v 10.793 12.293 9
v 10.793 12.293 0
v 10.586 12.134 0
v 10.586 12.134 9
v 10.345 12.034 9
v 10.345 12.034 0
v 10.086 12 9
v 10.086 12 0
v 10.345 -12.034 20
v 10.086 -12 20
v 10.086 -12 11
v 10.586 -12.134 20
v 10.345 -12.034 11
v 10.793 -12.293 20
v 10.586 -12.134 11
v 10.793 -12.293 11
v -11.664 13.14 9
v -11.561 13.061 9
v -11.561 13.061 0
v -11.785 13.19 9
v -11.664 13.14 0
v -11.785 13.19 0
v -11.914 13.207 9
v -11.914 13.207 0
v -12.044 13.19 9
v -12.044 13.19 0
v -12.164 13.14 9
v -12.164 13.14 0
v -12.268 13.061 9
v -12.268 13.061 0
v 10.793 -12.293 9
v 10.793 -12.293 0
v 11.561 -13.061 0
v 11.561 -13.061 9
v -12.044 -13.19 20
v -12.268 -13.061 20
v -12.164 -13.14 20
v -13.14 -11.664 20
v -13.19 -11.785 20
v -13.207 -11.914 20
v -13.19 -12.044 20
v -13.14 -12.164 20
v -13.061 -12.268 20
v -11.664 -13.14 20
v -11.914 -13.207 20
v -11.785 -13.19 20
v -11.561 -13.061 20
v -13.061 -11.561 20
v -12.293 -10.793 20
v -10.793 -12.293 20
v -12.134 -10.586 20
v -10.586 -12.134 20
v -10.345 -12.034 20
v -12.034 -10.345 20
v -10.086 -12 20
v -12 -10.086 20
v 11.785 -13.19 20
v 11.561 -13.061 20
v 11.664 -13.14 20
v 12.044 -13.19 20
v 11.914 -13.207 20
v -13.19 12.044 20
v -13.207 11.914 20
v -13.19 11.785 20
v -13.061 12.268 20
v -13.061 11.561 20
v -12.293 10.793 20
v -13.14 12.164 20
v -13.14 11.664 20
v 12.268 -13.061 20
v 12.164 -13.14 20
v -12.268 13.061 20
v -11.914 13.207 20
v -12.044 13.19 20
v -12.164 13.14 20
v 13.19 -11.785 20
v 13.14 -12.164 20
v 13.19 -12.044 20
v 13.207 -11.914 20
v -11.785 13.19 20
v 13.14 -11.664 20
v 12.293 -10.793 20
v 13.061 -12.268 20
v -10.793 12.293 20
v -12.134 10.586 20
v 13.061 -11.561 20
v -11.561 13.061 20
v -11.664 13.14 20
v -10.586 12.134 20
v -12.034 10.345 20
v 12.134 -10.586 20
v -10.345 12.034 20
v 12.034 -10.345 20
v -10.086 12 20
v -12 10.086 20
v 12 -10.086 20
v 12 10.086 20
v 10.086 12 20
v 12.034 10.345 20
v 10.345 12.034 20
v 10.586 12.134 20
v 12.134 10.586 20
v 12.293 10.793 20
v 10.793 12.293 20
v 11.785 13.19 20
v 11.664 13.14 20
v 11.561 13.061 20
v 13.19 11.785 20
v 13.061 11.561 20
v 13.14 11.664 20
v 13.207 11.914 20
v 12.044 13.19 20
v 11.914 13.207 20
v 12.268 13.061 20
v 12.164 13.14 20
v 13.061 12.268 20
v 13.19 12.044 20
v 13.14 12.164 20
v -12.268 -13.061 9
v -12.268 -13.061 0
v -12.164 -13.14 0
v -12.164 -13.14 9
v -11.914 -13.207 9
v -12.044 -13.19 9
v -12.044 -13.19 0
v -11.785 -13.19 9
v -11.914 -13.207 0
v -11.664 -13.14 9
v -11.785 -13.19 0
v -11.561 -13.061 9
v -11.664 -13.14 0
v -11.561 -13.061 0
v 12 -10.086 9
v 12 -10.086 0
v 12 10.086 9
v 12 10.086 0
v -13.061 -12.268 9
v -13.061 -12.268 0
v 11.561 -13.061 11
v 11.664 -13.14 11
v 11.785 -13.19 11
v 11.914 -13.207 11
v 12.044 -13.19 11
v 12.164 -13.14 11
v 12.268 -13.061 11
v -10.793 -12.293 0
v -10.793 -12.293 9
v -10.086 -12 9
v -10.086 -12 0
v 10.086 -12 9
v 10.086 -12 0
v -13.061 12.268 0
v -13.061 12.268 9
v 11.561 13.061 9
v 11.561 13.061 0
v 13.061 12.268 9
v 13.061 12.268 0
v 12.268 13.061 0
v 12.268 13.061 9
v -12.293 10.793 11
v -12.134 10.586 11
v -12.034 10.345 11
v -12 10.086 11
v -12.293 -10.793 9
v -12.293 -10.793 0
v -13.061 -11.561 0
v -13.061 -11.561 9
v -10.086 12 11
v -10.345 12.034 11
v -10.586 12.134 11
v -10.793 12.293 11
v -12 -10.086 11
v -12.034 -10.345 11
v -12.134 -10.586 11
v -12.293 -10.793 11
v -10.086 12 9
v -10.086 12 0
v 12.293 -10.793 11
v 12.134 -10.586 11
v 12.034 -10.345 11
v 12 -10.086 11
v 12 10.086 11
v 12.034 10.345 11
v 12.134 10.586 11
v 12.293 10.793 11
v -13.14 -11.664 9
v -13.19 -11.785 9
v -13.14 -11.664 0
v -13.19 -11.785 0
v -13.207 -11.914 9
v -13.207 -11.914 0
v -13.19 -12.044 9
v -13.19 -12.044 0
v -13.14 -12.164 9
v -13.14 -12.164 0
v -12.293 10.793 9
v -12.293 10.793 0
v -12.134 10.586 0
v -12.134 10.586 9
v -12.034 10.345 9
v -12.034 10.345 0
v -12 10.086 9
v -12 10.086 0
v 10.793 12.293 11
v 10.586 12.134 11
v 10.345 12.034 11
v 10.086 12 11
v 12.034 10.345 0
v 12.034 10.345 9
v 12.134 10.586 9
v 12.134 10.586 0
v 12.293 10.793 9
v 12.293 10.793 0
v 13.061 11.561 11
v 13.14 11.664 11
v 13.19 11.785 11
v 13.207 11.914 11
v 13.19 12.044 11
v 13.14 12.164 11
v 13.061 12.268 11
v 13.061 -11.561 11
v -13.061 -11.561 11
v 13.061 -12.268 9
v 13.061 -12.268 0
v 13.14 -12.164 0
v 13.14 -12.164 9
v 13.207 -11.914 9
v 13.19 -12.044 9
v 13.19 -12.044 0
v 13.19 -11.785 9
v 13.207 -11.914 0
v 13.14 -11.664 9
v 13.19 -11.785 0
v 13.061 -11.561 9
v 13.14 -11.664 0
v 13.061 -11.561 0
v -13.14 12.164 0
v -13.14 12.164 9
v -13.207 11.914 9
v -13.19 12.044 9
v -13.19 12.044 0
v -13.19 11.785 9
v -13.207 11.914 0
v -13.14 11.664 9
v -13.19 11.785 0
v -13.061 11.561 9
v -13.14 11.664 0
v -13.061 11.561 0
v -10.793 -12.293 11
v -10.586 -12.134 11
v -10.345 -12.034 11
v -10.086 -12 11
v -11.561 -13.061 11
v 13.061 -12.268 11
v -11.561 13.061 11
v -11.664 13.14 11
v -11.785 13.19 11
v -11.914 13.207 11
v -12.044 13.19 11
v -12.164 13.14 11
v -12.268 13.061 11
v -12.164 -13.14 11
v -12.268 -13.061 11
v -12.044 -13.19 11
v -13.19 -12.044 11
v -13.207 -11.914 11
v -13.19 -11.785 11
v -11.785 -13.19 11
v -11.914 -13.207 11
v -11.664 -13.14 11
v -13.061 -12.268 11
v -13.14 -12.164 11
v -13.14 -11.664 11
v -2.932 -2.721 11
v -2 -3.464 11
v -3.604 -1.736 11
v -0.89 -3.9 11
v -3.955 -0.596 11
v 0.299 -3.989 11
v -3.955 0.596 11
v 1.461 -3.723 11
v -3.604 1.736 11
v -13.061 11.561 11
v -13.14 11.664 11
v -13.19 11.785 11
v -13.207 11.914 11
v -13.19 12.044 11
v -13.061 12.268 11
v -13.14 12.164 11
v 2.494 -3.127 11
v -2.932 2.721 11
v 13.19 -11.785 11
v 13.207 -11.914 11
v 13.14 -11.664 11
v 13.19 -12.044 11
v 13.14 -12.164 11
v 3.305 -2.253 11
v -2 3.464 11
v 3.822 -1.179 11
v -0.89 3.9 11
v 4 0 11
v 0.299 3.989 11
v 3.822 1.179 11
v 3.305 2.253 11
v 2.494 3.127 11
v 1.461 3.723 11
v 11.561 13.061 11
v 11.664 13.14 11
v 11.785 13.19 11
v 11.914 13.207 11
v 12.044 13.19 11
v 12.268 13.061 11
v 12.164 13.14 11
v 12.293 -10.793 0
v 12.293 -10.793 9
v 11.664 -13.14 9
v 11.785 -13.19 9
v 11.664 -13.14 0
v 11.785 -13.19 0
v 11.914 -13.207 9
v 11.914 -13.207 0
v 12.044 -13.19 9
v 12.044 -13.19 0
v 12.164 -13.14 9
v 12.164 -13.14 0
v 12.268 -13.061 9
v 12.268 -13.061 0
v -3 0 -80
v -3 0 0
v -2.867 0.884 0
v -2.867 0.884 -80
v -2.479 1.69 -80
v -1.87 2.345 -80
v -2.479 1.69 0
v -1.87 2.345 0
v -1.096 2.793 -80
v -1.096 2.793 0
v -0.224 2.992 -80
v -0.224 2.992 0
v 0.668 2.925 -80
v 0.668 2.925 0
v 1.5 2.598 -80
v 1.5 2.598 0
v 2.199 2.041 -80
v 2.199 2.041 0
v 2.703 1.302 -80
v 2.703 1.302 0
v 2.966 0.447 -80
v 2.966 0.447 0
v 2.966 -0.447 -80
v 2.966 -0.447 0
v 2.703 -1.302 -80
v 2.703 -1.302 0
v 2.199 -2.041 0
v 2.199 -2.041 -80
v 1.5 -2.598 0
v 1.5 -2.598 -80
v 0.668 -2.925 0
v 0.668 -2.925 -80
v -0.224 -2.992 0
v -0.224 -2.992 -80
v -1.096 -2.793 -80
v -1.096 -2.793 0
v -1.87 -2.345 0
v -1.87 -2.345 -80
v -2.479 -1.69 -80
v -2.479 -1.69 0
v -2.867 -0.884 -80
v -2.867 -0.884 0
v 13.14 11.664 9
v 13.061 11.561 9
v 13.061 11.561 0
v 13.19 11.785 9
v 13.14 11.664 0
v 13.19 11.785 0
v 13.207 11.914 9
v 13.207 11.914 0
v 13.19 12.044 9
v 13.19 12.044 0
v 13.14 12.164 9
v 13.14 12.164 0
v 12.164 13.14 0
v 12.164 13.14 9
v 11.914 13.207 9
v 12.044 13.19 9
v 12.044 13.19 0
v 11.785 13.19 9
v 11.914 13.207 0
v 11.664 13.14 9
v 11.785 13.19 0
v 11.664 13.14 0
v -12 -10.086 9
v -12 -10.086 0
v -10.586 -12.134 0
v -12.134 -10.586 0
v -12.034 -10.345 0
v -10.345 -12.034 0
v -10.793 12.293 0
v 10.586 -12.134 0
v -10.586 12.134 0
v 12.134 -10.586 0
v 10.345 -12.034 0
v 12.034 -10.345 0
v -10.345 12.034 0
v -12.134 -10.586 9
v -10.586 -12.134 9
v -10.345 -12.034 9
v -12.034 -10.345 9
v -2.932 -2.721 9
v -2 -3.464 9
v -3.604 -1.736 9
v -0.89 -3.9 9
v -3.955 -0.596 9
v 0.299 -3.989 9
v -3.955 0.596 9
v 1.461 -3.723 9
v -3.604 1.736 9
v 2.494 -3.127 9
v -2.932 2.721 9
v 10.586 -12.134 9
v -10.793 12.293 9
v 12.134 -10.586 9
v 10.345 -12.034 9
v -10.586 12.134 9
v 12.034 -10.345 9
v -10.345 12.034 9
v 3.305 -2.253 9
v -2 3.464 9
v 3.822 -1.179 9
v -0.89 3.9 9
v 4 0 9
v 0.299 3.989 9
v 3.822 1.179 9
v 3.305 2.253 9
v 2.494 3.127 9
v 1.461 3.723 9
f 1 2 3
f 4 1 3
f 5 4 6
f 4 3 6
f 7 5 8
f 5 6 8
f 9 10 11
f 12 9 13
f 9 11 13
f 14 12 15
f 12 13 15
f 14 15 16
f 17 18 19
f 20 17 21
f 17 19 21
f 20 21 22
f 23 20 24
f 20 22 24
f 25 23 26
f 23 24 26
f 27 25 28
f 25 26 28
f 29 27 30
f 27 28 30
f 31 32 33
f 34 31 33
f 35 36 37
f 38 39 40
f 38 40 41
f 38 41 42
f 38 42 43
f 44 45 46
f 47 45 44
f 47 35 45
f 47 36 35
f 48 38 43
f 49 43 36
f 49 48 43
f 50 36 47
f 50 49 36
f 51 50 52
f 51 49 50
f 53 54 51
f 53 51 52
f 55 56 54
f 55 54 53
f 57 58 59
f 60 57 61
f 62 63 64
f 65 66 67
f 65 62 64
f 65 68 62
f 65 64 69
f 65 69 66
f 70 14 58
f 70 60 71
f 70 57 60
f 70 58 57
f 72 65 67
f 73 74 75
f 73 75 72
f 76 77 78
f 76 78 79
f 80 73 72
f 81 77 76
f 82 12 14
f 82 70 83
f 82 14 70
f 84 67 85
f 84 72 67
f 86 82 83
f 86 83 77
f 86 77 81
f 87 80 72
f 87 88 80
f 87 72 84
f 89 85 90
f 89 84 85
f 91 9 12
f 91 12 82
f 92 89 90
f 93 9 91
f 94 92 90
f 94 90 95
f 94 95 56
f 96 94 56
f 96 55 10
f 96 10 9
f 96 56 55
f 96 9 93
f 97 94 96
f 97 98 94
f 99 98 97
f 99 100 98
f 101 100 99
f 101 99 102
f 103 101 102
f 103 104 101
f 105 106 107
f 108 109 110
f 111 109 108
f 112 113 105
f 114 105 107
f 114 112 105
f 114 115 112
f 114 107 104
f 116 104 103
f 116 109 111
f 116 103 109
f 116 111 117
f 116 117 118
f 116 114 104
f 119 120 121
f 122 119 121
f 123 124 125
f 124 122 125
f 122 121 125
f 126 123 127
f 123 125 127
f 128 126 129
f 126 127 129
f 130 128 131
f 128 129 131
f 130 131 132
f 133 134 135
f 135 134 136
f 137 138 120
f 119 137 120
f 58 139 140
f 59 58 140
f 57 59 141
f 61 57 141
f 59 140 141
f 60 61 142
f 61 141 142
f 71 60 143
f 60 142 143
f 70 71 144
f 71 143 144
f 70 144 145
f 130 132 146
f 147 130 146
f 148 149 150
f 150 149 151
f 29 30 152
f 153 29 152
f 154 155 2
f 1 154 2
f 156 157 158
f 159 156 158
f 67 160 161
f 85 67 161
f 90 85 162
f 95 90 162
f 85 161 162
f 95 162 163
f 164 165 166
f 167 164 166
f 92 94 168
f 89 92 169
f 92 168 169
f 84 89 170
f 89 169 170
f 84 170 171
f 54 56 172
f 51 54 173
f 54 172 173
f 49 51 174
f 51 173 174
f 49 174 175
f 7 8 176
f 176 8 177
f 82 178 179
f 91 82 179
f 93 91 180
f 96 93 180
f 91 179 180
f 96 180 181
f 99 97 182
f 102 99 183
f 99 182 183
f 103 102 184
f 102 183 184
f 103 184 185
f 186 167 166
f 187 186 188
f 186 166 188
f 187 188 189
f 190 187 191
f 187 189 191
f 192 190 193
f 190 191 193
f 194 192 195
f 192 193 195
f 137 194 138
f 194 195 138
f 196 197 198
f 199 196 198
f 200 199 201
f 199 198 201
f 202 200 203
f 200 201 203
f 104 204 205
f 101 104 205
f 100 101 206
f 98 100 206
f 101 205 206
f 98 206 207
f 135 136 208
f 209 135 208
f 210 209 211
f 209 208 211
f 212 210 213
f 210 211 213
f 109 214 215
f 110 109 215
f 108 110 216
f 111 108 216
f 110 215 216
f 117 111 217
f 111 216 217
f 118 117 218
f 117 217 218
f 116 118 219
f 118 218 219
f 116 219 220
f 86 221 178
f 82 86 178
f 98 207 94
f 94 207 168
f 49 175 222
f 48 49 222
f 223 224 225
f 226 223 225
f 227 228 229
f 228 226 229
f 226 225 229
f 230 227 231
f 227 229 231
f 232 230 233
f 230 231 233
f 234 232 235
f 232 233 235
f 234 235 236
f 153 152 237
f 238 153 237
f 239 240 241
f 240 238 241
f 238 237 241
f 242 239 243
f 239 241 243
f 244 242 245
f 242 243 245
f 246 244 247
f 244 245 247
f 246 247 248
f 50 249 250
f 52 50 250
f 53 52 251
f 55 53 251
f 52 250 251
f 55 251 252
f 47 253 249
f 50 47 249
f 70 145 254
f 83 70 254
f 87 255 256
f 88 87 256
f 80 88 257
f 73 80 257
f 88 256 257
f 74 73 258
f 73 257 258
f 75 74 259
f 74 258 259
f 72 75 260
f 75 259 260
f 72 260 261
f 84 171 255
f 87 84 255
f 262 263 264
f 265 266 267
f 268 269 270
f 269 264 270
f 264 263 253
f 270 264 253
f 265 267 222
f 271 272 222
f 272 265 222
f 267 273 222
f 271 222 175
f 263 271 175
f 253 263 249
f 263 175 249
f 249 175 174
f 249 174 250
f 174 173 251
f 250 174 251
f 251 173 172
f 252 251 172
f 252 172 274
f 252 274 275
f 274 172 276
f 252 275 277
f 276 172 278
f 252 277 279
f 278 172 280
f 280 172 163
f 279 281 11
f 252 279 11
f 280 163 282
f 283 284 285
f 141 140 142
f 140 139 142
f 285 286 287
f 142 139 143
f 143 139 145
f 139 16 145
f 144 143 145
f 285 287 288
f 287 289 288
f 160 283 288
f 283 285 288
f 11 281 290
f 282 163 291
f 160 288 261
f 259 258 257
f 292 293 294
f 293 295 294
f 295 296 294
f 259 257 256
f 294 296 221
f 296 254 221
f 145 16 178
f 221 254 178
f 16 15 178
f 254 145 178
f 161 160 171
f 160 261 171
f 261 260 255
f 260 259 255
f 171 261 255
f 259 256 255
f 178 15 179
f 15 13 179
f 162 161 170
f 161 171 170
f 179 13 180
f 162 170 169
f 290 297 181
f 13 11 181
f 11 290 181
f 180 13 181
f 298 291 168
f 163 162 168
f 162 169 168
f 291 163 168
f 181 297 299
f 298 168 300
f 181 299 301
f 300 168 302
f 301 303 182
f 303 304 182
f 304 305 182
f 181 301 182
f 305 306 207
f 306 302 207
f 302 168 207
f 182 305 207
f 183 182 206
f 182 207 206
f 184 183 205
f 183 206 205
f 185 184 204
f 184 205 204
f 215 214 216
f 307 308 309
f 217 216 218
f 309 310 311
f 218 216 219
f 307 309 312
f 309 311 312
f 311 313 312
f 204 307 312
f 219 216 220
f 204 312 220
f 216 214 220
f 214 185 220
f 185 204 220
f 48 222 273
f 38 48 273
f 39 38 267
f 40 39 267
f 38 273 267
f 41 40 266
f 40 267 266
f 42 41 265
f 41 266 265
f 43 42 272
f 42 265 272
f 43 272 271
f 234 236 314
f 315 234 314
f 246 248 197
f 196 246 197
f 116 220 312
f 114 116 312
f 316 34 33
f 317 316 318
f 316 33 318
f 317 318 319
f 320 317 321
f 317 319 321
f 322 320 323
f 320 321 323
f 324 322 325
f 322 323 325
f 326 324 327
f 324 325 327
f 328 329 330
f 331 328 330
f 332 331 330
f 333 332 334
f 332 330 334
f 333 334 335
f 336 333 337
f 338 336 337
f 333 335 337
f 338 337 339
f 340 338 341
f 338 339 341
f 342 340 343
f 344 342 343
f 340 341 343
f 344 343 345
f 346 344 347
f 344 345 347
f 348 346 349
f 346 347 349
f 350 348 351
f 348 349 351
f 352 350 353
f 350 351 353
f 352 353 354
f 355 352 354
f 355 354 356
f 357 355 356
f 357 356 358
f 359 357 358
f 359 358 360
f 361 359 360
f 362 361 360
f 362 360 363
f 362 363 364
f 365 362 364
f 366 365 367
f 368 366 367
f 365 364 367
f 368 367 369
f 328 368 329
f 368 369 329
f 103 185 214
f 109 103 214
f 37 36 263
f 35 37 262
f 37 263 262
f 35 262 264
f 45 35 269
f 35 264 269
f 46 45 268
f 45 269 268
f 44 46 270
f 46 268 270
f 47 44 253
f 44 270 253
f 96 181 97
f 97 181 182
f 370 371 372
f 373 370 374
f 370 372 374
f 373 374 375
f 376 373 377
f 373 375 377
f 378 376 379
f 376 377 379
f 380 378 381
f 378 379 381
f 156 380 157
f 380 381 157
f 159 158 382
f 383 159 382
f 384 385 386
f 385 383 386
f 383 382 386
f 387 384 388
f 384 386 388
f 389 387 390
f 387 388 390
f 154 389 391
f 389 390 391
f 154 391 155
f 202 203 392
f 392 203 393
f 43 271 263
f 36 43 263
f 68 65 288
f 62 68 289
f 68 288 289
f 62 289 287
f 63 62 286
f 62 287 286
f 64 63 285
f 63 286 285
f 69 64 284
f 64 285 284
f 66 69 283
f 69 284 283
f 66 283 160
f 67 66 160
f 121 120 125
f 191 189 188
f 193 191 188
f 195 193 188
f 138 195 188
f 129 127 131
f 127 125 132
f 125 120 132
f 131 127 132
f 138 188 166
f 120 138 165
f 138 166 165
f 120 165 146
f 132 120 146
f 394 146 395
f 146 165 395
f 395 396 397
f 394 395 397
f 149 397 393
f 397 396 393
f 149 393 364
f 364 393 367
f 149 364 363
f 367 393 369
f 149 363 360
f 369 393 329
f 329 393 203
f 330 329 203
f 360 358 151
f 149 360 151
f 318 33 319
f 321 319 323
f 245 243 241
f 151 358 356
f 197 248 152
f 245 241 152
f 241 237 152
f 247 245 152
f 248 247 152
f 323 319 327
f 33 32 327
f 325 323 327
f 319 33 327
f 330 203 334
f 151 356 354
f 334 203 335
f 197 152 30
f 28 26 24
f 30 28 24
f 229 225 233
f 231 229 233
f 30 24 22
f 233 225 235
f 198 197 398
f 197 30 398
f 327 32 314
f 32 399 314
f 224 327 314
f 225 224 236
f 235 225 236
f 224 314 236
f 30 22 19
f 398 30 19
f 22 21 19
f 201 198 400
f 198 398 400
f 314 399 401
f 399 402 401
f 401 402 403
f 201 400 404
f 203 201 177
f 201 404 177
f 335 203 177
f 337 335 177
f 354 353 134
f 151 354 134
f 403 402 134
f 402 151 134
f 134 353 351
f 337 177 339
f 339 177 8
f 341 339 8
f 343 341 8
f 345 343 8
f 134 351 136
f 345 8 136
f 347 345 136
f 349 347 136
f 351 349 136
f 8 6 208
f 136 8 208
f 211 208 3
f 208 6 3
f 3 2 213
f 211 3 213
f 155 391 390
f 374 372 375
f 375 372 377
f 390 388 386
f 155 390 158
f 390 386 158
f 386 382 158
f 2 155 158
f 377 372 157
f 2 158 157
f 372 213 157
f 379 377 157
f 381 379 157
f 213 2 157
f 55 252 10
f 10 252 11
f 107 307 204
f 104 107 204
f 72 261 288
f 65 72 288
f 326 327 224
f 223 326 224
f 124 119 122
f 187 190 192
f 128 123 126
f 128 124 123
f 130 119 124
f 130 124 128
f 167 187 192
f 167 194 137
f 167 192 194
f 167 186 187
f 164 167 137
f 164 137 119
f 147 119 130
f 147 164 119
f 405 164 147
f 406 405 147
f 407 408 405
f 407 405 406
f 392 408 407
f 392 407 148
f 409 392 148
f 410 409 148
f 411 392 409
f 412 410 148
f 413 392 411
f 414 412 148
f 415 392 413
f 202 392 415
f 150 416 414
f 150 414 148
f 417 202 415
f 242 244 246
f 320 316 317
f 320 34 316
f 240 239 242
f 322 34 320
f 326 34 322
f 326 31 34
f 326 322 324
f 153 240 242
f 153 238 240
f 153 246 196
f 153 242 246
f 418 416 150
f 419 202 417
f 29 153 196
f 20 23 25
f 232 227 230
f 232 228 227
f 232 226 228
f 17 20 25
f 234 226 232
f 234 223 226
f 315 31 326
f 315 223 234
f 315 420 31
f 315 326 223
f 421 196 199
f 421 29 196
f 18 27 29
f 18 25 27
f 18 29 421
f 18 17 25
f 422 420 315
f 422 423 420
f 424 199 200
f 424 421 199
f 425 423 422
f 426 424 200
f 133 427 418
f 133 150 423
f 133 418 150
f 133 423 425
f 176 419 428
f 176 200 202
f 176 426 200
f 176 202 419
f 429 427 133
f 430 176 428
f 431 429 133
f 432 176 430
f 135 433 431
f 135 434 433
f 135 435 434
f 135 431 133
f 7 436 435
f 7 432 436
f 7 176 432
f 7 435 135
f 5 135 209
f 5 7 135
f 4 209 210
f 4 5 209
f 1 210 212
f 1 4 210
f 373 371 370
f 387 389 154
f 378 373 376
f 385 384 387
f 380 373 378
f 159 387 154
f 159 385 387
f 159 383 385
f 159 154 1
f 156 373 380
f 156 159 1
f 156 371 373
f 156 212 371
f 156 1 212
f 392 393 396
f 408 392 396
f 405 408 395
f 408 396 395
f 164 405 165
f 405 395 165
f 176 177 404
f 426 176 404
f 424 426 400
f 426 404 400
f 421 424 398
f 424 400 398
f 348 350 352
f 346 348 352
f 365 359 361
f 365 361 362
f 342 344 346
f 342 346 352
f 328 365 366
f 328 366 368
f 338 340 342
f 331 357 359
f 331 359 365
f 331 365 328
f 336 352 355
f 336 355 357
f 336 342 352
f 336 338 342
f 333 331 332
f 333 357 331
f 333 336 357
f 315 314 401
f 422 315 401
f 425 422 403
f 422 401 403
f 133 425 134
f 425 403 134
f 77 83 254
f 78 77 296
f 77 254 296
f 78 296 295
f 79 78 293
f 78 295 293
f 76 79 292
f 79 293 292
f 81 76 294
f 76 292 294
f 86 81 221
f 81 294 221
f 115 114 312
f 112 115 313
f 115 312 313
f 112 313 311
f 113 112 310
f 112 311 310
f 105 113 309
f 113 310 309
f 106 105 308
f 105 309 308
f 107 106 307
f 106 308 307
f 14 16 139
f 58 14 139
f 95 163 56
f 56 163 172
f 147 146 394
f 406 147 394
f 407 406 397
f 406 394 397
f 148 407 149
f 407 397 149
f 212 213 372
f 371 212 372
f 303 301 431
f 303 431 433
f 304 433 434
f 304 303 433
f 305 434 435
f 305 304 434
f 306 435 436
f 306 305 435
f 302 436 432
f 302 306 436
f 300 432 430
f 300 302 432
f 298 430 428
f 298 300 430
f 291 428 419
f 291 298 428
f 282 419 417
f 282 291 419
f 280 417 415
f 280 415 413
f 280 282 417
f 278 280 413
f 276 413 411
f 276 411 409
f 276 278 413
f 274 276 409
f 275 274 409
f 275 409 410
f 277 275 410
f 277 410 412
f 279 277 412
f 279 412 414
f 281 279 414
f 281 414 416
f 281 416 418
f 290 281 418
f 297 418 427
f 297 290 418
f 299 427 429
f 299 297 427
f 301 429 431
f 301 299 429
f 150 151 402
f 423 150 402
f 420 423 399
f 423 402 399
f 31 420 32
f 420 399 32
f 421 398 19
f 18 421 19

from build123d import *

# Parameters (mm, degrees)
BOSS_EXTRUDE1_DEPTH = 20
SKETCH3_R           = 3
BOSS_EXTRUDE2_DEPTH = 80
SKETCH5_R           = 20
SKETCH5_R_2         = 4
CUT_EXTRUDE1_DEPTH  = 2


with BuildPart() as part:
    # Sketch1 → Boss-Extrude1 (new body)
    with BuildSketch(Plane.XY):
        with BuildLine():
            Line((-13.060660172, 11.560660172), (-12.292893219, 10.792893219))
            ThreePointArc((-12.292893219, 10.792893219), (-12.076120467, 10.46846987), (-12, 10.085786438))
            Line((-12, 10.085786438), (-12, -10.085786438))
            ThreePointArc((-12, -10.085786438), (-12.076120467, -10.46846987), (-12.292893219, -10.792893219))
            Line((-12.292893219, -10.792893219), (-13.060660172, -11.560660172))
            ThreePointArc((-13.060660172, -11.560660172), (-13.207106781, -11.914213562), (-13.060660172, -12.267766953))
            Line((-13.060660172, -12.267766953), (-12.267766953, -13.060660172))
            ThreePointArc((-12.267766953, -13.060660172), (-11.914213562, -13.207106781), (-11.560660172, -13.060660172))
            Line((-11.560660172, -13.060660172), (-10.792893219, -12.292893219))
            ThreePointArc((-10.792893219, -12.292893219), (-10.46846987, -12.076120467), (-10.085786438, -12))
            Line((-10.085786438, -12), (10.085786438, -12))
            ThreePointArc((10.085786438, -12), (10.46846987, -12.076120467), (10.792893219, -12.292893219))
            Line((10.792893219, -12.292893219), (11.560660172, -13.060660172))
            ThreePointArc((11.560660172, -13.060660172), (11.914213562, -13.207106781), (12.267766953, -13.060660172))
            Line((12.267766953, -13.060660172), (13.060660172, -12.267766953))
            ThreePointArc((13.060660172, -12.267766953), (13.207106781, -11.914213562), (13.060660172, -11.560660172))
            Line((13.060660172, -11.560660172), (12.292893219, -10.792893219))
            ThreePointArc((12.292893219, -10.792893219), (12.076120467, -10.46846987), (12, -10.085786438))
            Line((12, -10.085786438), (12, 10.085786438))
            ThreePointArc((12, 10.085786438), (12.076120467, 10.46846987), (12.292893219, 10.792893219))
            Line((12.292893219, 10.792893219), (13.060660172, 11.560660172))
            ThreePointArc((13.060660172, 11.560660172), (13.207106781, 11.914213562), (13.060660172, 12.267766953))
            Line((13.060660172, 12.267766953), (12.267766953, 13.060660172))
            ThreePointArc((12.267766953, 13.060660172), (11.914213562, 13.207106781), (11.560660172, 13.060660172))
            Line((11.560660172, 13.060660172), (10.792893219, 12.292893219))
            ThreePointArc((10.792893219, 12.292893219), (10.46846987, 12.076120467), (10.085786438, 12))
            Line((10.085786438, 12), (-10.085786438, 12))
            ThreePointArc((-10.085786438, 12), (-10.46846987, 12.076120467), (-10.792893219, 12.292893219))
            Line((-10.792893219, 12.292893219), (-11.560660172, 13.060660172))
            ThreePointArc((-11.560660172, 13.060660172), (-11.914213562, 13.207106781), (-12.267766953, 13.060660172))
            Line((-12.267766953, 13.060660172), (-13.060660172, 12.267766953))
            ThreePointArc((-13.060660172, 12.267766953), (-13.207106781, 11.914213562), (-13.060660172, 11.560660172))
        make_face()
    extrude(amount=BOSS_EXTRUDE1_DEPTH)

    # Sketch3 → Boss-Extrude2 (add)
    with BuildSketch(Plane(origin=(0, 0, 0), x_dir=(-1, 0, 0), z_dir=(0, 0, -1))):
        Circle(SKETCH3_R)
    extrude(amount=BOSS_EXTRUDE2_DEPTH)

    # Sketch5 → Cut-Extrude1 (cut)
    with BuildSketch(Plane.XY.offset(11)):
        Circle(SKETCH5_R)
        Circle(SKETCH5_R_2, mode=Mode.SUBTRACT)
    extrude(amount=-CUT_EXTRUDE1_DEPTH, mode=Mode.SUBTRACT)


solid = part.part
